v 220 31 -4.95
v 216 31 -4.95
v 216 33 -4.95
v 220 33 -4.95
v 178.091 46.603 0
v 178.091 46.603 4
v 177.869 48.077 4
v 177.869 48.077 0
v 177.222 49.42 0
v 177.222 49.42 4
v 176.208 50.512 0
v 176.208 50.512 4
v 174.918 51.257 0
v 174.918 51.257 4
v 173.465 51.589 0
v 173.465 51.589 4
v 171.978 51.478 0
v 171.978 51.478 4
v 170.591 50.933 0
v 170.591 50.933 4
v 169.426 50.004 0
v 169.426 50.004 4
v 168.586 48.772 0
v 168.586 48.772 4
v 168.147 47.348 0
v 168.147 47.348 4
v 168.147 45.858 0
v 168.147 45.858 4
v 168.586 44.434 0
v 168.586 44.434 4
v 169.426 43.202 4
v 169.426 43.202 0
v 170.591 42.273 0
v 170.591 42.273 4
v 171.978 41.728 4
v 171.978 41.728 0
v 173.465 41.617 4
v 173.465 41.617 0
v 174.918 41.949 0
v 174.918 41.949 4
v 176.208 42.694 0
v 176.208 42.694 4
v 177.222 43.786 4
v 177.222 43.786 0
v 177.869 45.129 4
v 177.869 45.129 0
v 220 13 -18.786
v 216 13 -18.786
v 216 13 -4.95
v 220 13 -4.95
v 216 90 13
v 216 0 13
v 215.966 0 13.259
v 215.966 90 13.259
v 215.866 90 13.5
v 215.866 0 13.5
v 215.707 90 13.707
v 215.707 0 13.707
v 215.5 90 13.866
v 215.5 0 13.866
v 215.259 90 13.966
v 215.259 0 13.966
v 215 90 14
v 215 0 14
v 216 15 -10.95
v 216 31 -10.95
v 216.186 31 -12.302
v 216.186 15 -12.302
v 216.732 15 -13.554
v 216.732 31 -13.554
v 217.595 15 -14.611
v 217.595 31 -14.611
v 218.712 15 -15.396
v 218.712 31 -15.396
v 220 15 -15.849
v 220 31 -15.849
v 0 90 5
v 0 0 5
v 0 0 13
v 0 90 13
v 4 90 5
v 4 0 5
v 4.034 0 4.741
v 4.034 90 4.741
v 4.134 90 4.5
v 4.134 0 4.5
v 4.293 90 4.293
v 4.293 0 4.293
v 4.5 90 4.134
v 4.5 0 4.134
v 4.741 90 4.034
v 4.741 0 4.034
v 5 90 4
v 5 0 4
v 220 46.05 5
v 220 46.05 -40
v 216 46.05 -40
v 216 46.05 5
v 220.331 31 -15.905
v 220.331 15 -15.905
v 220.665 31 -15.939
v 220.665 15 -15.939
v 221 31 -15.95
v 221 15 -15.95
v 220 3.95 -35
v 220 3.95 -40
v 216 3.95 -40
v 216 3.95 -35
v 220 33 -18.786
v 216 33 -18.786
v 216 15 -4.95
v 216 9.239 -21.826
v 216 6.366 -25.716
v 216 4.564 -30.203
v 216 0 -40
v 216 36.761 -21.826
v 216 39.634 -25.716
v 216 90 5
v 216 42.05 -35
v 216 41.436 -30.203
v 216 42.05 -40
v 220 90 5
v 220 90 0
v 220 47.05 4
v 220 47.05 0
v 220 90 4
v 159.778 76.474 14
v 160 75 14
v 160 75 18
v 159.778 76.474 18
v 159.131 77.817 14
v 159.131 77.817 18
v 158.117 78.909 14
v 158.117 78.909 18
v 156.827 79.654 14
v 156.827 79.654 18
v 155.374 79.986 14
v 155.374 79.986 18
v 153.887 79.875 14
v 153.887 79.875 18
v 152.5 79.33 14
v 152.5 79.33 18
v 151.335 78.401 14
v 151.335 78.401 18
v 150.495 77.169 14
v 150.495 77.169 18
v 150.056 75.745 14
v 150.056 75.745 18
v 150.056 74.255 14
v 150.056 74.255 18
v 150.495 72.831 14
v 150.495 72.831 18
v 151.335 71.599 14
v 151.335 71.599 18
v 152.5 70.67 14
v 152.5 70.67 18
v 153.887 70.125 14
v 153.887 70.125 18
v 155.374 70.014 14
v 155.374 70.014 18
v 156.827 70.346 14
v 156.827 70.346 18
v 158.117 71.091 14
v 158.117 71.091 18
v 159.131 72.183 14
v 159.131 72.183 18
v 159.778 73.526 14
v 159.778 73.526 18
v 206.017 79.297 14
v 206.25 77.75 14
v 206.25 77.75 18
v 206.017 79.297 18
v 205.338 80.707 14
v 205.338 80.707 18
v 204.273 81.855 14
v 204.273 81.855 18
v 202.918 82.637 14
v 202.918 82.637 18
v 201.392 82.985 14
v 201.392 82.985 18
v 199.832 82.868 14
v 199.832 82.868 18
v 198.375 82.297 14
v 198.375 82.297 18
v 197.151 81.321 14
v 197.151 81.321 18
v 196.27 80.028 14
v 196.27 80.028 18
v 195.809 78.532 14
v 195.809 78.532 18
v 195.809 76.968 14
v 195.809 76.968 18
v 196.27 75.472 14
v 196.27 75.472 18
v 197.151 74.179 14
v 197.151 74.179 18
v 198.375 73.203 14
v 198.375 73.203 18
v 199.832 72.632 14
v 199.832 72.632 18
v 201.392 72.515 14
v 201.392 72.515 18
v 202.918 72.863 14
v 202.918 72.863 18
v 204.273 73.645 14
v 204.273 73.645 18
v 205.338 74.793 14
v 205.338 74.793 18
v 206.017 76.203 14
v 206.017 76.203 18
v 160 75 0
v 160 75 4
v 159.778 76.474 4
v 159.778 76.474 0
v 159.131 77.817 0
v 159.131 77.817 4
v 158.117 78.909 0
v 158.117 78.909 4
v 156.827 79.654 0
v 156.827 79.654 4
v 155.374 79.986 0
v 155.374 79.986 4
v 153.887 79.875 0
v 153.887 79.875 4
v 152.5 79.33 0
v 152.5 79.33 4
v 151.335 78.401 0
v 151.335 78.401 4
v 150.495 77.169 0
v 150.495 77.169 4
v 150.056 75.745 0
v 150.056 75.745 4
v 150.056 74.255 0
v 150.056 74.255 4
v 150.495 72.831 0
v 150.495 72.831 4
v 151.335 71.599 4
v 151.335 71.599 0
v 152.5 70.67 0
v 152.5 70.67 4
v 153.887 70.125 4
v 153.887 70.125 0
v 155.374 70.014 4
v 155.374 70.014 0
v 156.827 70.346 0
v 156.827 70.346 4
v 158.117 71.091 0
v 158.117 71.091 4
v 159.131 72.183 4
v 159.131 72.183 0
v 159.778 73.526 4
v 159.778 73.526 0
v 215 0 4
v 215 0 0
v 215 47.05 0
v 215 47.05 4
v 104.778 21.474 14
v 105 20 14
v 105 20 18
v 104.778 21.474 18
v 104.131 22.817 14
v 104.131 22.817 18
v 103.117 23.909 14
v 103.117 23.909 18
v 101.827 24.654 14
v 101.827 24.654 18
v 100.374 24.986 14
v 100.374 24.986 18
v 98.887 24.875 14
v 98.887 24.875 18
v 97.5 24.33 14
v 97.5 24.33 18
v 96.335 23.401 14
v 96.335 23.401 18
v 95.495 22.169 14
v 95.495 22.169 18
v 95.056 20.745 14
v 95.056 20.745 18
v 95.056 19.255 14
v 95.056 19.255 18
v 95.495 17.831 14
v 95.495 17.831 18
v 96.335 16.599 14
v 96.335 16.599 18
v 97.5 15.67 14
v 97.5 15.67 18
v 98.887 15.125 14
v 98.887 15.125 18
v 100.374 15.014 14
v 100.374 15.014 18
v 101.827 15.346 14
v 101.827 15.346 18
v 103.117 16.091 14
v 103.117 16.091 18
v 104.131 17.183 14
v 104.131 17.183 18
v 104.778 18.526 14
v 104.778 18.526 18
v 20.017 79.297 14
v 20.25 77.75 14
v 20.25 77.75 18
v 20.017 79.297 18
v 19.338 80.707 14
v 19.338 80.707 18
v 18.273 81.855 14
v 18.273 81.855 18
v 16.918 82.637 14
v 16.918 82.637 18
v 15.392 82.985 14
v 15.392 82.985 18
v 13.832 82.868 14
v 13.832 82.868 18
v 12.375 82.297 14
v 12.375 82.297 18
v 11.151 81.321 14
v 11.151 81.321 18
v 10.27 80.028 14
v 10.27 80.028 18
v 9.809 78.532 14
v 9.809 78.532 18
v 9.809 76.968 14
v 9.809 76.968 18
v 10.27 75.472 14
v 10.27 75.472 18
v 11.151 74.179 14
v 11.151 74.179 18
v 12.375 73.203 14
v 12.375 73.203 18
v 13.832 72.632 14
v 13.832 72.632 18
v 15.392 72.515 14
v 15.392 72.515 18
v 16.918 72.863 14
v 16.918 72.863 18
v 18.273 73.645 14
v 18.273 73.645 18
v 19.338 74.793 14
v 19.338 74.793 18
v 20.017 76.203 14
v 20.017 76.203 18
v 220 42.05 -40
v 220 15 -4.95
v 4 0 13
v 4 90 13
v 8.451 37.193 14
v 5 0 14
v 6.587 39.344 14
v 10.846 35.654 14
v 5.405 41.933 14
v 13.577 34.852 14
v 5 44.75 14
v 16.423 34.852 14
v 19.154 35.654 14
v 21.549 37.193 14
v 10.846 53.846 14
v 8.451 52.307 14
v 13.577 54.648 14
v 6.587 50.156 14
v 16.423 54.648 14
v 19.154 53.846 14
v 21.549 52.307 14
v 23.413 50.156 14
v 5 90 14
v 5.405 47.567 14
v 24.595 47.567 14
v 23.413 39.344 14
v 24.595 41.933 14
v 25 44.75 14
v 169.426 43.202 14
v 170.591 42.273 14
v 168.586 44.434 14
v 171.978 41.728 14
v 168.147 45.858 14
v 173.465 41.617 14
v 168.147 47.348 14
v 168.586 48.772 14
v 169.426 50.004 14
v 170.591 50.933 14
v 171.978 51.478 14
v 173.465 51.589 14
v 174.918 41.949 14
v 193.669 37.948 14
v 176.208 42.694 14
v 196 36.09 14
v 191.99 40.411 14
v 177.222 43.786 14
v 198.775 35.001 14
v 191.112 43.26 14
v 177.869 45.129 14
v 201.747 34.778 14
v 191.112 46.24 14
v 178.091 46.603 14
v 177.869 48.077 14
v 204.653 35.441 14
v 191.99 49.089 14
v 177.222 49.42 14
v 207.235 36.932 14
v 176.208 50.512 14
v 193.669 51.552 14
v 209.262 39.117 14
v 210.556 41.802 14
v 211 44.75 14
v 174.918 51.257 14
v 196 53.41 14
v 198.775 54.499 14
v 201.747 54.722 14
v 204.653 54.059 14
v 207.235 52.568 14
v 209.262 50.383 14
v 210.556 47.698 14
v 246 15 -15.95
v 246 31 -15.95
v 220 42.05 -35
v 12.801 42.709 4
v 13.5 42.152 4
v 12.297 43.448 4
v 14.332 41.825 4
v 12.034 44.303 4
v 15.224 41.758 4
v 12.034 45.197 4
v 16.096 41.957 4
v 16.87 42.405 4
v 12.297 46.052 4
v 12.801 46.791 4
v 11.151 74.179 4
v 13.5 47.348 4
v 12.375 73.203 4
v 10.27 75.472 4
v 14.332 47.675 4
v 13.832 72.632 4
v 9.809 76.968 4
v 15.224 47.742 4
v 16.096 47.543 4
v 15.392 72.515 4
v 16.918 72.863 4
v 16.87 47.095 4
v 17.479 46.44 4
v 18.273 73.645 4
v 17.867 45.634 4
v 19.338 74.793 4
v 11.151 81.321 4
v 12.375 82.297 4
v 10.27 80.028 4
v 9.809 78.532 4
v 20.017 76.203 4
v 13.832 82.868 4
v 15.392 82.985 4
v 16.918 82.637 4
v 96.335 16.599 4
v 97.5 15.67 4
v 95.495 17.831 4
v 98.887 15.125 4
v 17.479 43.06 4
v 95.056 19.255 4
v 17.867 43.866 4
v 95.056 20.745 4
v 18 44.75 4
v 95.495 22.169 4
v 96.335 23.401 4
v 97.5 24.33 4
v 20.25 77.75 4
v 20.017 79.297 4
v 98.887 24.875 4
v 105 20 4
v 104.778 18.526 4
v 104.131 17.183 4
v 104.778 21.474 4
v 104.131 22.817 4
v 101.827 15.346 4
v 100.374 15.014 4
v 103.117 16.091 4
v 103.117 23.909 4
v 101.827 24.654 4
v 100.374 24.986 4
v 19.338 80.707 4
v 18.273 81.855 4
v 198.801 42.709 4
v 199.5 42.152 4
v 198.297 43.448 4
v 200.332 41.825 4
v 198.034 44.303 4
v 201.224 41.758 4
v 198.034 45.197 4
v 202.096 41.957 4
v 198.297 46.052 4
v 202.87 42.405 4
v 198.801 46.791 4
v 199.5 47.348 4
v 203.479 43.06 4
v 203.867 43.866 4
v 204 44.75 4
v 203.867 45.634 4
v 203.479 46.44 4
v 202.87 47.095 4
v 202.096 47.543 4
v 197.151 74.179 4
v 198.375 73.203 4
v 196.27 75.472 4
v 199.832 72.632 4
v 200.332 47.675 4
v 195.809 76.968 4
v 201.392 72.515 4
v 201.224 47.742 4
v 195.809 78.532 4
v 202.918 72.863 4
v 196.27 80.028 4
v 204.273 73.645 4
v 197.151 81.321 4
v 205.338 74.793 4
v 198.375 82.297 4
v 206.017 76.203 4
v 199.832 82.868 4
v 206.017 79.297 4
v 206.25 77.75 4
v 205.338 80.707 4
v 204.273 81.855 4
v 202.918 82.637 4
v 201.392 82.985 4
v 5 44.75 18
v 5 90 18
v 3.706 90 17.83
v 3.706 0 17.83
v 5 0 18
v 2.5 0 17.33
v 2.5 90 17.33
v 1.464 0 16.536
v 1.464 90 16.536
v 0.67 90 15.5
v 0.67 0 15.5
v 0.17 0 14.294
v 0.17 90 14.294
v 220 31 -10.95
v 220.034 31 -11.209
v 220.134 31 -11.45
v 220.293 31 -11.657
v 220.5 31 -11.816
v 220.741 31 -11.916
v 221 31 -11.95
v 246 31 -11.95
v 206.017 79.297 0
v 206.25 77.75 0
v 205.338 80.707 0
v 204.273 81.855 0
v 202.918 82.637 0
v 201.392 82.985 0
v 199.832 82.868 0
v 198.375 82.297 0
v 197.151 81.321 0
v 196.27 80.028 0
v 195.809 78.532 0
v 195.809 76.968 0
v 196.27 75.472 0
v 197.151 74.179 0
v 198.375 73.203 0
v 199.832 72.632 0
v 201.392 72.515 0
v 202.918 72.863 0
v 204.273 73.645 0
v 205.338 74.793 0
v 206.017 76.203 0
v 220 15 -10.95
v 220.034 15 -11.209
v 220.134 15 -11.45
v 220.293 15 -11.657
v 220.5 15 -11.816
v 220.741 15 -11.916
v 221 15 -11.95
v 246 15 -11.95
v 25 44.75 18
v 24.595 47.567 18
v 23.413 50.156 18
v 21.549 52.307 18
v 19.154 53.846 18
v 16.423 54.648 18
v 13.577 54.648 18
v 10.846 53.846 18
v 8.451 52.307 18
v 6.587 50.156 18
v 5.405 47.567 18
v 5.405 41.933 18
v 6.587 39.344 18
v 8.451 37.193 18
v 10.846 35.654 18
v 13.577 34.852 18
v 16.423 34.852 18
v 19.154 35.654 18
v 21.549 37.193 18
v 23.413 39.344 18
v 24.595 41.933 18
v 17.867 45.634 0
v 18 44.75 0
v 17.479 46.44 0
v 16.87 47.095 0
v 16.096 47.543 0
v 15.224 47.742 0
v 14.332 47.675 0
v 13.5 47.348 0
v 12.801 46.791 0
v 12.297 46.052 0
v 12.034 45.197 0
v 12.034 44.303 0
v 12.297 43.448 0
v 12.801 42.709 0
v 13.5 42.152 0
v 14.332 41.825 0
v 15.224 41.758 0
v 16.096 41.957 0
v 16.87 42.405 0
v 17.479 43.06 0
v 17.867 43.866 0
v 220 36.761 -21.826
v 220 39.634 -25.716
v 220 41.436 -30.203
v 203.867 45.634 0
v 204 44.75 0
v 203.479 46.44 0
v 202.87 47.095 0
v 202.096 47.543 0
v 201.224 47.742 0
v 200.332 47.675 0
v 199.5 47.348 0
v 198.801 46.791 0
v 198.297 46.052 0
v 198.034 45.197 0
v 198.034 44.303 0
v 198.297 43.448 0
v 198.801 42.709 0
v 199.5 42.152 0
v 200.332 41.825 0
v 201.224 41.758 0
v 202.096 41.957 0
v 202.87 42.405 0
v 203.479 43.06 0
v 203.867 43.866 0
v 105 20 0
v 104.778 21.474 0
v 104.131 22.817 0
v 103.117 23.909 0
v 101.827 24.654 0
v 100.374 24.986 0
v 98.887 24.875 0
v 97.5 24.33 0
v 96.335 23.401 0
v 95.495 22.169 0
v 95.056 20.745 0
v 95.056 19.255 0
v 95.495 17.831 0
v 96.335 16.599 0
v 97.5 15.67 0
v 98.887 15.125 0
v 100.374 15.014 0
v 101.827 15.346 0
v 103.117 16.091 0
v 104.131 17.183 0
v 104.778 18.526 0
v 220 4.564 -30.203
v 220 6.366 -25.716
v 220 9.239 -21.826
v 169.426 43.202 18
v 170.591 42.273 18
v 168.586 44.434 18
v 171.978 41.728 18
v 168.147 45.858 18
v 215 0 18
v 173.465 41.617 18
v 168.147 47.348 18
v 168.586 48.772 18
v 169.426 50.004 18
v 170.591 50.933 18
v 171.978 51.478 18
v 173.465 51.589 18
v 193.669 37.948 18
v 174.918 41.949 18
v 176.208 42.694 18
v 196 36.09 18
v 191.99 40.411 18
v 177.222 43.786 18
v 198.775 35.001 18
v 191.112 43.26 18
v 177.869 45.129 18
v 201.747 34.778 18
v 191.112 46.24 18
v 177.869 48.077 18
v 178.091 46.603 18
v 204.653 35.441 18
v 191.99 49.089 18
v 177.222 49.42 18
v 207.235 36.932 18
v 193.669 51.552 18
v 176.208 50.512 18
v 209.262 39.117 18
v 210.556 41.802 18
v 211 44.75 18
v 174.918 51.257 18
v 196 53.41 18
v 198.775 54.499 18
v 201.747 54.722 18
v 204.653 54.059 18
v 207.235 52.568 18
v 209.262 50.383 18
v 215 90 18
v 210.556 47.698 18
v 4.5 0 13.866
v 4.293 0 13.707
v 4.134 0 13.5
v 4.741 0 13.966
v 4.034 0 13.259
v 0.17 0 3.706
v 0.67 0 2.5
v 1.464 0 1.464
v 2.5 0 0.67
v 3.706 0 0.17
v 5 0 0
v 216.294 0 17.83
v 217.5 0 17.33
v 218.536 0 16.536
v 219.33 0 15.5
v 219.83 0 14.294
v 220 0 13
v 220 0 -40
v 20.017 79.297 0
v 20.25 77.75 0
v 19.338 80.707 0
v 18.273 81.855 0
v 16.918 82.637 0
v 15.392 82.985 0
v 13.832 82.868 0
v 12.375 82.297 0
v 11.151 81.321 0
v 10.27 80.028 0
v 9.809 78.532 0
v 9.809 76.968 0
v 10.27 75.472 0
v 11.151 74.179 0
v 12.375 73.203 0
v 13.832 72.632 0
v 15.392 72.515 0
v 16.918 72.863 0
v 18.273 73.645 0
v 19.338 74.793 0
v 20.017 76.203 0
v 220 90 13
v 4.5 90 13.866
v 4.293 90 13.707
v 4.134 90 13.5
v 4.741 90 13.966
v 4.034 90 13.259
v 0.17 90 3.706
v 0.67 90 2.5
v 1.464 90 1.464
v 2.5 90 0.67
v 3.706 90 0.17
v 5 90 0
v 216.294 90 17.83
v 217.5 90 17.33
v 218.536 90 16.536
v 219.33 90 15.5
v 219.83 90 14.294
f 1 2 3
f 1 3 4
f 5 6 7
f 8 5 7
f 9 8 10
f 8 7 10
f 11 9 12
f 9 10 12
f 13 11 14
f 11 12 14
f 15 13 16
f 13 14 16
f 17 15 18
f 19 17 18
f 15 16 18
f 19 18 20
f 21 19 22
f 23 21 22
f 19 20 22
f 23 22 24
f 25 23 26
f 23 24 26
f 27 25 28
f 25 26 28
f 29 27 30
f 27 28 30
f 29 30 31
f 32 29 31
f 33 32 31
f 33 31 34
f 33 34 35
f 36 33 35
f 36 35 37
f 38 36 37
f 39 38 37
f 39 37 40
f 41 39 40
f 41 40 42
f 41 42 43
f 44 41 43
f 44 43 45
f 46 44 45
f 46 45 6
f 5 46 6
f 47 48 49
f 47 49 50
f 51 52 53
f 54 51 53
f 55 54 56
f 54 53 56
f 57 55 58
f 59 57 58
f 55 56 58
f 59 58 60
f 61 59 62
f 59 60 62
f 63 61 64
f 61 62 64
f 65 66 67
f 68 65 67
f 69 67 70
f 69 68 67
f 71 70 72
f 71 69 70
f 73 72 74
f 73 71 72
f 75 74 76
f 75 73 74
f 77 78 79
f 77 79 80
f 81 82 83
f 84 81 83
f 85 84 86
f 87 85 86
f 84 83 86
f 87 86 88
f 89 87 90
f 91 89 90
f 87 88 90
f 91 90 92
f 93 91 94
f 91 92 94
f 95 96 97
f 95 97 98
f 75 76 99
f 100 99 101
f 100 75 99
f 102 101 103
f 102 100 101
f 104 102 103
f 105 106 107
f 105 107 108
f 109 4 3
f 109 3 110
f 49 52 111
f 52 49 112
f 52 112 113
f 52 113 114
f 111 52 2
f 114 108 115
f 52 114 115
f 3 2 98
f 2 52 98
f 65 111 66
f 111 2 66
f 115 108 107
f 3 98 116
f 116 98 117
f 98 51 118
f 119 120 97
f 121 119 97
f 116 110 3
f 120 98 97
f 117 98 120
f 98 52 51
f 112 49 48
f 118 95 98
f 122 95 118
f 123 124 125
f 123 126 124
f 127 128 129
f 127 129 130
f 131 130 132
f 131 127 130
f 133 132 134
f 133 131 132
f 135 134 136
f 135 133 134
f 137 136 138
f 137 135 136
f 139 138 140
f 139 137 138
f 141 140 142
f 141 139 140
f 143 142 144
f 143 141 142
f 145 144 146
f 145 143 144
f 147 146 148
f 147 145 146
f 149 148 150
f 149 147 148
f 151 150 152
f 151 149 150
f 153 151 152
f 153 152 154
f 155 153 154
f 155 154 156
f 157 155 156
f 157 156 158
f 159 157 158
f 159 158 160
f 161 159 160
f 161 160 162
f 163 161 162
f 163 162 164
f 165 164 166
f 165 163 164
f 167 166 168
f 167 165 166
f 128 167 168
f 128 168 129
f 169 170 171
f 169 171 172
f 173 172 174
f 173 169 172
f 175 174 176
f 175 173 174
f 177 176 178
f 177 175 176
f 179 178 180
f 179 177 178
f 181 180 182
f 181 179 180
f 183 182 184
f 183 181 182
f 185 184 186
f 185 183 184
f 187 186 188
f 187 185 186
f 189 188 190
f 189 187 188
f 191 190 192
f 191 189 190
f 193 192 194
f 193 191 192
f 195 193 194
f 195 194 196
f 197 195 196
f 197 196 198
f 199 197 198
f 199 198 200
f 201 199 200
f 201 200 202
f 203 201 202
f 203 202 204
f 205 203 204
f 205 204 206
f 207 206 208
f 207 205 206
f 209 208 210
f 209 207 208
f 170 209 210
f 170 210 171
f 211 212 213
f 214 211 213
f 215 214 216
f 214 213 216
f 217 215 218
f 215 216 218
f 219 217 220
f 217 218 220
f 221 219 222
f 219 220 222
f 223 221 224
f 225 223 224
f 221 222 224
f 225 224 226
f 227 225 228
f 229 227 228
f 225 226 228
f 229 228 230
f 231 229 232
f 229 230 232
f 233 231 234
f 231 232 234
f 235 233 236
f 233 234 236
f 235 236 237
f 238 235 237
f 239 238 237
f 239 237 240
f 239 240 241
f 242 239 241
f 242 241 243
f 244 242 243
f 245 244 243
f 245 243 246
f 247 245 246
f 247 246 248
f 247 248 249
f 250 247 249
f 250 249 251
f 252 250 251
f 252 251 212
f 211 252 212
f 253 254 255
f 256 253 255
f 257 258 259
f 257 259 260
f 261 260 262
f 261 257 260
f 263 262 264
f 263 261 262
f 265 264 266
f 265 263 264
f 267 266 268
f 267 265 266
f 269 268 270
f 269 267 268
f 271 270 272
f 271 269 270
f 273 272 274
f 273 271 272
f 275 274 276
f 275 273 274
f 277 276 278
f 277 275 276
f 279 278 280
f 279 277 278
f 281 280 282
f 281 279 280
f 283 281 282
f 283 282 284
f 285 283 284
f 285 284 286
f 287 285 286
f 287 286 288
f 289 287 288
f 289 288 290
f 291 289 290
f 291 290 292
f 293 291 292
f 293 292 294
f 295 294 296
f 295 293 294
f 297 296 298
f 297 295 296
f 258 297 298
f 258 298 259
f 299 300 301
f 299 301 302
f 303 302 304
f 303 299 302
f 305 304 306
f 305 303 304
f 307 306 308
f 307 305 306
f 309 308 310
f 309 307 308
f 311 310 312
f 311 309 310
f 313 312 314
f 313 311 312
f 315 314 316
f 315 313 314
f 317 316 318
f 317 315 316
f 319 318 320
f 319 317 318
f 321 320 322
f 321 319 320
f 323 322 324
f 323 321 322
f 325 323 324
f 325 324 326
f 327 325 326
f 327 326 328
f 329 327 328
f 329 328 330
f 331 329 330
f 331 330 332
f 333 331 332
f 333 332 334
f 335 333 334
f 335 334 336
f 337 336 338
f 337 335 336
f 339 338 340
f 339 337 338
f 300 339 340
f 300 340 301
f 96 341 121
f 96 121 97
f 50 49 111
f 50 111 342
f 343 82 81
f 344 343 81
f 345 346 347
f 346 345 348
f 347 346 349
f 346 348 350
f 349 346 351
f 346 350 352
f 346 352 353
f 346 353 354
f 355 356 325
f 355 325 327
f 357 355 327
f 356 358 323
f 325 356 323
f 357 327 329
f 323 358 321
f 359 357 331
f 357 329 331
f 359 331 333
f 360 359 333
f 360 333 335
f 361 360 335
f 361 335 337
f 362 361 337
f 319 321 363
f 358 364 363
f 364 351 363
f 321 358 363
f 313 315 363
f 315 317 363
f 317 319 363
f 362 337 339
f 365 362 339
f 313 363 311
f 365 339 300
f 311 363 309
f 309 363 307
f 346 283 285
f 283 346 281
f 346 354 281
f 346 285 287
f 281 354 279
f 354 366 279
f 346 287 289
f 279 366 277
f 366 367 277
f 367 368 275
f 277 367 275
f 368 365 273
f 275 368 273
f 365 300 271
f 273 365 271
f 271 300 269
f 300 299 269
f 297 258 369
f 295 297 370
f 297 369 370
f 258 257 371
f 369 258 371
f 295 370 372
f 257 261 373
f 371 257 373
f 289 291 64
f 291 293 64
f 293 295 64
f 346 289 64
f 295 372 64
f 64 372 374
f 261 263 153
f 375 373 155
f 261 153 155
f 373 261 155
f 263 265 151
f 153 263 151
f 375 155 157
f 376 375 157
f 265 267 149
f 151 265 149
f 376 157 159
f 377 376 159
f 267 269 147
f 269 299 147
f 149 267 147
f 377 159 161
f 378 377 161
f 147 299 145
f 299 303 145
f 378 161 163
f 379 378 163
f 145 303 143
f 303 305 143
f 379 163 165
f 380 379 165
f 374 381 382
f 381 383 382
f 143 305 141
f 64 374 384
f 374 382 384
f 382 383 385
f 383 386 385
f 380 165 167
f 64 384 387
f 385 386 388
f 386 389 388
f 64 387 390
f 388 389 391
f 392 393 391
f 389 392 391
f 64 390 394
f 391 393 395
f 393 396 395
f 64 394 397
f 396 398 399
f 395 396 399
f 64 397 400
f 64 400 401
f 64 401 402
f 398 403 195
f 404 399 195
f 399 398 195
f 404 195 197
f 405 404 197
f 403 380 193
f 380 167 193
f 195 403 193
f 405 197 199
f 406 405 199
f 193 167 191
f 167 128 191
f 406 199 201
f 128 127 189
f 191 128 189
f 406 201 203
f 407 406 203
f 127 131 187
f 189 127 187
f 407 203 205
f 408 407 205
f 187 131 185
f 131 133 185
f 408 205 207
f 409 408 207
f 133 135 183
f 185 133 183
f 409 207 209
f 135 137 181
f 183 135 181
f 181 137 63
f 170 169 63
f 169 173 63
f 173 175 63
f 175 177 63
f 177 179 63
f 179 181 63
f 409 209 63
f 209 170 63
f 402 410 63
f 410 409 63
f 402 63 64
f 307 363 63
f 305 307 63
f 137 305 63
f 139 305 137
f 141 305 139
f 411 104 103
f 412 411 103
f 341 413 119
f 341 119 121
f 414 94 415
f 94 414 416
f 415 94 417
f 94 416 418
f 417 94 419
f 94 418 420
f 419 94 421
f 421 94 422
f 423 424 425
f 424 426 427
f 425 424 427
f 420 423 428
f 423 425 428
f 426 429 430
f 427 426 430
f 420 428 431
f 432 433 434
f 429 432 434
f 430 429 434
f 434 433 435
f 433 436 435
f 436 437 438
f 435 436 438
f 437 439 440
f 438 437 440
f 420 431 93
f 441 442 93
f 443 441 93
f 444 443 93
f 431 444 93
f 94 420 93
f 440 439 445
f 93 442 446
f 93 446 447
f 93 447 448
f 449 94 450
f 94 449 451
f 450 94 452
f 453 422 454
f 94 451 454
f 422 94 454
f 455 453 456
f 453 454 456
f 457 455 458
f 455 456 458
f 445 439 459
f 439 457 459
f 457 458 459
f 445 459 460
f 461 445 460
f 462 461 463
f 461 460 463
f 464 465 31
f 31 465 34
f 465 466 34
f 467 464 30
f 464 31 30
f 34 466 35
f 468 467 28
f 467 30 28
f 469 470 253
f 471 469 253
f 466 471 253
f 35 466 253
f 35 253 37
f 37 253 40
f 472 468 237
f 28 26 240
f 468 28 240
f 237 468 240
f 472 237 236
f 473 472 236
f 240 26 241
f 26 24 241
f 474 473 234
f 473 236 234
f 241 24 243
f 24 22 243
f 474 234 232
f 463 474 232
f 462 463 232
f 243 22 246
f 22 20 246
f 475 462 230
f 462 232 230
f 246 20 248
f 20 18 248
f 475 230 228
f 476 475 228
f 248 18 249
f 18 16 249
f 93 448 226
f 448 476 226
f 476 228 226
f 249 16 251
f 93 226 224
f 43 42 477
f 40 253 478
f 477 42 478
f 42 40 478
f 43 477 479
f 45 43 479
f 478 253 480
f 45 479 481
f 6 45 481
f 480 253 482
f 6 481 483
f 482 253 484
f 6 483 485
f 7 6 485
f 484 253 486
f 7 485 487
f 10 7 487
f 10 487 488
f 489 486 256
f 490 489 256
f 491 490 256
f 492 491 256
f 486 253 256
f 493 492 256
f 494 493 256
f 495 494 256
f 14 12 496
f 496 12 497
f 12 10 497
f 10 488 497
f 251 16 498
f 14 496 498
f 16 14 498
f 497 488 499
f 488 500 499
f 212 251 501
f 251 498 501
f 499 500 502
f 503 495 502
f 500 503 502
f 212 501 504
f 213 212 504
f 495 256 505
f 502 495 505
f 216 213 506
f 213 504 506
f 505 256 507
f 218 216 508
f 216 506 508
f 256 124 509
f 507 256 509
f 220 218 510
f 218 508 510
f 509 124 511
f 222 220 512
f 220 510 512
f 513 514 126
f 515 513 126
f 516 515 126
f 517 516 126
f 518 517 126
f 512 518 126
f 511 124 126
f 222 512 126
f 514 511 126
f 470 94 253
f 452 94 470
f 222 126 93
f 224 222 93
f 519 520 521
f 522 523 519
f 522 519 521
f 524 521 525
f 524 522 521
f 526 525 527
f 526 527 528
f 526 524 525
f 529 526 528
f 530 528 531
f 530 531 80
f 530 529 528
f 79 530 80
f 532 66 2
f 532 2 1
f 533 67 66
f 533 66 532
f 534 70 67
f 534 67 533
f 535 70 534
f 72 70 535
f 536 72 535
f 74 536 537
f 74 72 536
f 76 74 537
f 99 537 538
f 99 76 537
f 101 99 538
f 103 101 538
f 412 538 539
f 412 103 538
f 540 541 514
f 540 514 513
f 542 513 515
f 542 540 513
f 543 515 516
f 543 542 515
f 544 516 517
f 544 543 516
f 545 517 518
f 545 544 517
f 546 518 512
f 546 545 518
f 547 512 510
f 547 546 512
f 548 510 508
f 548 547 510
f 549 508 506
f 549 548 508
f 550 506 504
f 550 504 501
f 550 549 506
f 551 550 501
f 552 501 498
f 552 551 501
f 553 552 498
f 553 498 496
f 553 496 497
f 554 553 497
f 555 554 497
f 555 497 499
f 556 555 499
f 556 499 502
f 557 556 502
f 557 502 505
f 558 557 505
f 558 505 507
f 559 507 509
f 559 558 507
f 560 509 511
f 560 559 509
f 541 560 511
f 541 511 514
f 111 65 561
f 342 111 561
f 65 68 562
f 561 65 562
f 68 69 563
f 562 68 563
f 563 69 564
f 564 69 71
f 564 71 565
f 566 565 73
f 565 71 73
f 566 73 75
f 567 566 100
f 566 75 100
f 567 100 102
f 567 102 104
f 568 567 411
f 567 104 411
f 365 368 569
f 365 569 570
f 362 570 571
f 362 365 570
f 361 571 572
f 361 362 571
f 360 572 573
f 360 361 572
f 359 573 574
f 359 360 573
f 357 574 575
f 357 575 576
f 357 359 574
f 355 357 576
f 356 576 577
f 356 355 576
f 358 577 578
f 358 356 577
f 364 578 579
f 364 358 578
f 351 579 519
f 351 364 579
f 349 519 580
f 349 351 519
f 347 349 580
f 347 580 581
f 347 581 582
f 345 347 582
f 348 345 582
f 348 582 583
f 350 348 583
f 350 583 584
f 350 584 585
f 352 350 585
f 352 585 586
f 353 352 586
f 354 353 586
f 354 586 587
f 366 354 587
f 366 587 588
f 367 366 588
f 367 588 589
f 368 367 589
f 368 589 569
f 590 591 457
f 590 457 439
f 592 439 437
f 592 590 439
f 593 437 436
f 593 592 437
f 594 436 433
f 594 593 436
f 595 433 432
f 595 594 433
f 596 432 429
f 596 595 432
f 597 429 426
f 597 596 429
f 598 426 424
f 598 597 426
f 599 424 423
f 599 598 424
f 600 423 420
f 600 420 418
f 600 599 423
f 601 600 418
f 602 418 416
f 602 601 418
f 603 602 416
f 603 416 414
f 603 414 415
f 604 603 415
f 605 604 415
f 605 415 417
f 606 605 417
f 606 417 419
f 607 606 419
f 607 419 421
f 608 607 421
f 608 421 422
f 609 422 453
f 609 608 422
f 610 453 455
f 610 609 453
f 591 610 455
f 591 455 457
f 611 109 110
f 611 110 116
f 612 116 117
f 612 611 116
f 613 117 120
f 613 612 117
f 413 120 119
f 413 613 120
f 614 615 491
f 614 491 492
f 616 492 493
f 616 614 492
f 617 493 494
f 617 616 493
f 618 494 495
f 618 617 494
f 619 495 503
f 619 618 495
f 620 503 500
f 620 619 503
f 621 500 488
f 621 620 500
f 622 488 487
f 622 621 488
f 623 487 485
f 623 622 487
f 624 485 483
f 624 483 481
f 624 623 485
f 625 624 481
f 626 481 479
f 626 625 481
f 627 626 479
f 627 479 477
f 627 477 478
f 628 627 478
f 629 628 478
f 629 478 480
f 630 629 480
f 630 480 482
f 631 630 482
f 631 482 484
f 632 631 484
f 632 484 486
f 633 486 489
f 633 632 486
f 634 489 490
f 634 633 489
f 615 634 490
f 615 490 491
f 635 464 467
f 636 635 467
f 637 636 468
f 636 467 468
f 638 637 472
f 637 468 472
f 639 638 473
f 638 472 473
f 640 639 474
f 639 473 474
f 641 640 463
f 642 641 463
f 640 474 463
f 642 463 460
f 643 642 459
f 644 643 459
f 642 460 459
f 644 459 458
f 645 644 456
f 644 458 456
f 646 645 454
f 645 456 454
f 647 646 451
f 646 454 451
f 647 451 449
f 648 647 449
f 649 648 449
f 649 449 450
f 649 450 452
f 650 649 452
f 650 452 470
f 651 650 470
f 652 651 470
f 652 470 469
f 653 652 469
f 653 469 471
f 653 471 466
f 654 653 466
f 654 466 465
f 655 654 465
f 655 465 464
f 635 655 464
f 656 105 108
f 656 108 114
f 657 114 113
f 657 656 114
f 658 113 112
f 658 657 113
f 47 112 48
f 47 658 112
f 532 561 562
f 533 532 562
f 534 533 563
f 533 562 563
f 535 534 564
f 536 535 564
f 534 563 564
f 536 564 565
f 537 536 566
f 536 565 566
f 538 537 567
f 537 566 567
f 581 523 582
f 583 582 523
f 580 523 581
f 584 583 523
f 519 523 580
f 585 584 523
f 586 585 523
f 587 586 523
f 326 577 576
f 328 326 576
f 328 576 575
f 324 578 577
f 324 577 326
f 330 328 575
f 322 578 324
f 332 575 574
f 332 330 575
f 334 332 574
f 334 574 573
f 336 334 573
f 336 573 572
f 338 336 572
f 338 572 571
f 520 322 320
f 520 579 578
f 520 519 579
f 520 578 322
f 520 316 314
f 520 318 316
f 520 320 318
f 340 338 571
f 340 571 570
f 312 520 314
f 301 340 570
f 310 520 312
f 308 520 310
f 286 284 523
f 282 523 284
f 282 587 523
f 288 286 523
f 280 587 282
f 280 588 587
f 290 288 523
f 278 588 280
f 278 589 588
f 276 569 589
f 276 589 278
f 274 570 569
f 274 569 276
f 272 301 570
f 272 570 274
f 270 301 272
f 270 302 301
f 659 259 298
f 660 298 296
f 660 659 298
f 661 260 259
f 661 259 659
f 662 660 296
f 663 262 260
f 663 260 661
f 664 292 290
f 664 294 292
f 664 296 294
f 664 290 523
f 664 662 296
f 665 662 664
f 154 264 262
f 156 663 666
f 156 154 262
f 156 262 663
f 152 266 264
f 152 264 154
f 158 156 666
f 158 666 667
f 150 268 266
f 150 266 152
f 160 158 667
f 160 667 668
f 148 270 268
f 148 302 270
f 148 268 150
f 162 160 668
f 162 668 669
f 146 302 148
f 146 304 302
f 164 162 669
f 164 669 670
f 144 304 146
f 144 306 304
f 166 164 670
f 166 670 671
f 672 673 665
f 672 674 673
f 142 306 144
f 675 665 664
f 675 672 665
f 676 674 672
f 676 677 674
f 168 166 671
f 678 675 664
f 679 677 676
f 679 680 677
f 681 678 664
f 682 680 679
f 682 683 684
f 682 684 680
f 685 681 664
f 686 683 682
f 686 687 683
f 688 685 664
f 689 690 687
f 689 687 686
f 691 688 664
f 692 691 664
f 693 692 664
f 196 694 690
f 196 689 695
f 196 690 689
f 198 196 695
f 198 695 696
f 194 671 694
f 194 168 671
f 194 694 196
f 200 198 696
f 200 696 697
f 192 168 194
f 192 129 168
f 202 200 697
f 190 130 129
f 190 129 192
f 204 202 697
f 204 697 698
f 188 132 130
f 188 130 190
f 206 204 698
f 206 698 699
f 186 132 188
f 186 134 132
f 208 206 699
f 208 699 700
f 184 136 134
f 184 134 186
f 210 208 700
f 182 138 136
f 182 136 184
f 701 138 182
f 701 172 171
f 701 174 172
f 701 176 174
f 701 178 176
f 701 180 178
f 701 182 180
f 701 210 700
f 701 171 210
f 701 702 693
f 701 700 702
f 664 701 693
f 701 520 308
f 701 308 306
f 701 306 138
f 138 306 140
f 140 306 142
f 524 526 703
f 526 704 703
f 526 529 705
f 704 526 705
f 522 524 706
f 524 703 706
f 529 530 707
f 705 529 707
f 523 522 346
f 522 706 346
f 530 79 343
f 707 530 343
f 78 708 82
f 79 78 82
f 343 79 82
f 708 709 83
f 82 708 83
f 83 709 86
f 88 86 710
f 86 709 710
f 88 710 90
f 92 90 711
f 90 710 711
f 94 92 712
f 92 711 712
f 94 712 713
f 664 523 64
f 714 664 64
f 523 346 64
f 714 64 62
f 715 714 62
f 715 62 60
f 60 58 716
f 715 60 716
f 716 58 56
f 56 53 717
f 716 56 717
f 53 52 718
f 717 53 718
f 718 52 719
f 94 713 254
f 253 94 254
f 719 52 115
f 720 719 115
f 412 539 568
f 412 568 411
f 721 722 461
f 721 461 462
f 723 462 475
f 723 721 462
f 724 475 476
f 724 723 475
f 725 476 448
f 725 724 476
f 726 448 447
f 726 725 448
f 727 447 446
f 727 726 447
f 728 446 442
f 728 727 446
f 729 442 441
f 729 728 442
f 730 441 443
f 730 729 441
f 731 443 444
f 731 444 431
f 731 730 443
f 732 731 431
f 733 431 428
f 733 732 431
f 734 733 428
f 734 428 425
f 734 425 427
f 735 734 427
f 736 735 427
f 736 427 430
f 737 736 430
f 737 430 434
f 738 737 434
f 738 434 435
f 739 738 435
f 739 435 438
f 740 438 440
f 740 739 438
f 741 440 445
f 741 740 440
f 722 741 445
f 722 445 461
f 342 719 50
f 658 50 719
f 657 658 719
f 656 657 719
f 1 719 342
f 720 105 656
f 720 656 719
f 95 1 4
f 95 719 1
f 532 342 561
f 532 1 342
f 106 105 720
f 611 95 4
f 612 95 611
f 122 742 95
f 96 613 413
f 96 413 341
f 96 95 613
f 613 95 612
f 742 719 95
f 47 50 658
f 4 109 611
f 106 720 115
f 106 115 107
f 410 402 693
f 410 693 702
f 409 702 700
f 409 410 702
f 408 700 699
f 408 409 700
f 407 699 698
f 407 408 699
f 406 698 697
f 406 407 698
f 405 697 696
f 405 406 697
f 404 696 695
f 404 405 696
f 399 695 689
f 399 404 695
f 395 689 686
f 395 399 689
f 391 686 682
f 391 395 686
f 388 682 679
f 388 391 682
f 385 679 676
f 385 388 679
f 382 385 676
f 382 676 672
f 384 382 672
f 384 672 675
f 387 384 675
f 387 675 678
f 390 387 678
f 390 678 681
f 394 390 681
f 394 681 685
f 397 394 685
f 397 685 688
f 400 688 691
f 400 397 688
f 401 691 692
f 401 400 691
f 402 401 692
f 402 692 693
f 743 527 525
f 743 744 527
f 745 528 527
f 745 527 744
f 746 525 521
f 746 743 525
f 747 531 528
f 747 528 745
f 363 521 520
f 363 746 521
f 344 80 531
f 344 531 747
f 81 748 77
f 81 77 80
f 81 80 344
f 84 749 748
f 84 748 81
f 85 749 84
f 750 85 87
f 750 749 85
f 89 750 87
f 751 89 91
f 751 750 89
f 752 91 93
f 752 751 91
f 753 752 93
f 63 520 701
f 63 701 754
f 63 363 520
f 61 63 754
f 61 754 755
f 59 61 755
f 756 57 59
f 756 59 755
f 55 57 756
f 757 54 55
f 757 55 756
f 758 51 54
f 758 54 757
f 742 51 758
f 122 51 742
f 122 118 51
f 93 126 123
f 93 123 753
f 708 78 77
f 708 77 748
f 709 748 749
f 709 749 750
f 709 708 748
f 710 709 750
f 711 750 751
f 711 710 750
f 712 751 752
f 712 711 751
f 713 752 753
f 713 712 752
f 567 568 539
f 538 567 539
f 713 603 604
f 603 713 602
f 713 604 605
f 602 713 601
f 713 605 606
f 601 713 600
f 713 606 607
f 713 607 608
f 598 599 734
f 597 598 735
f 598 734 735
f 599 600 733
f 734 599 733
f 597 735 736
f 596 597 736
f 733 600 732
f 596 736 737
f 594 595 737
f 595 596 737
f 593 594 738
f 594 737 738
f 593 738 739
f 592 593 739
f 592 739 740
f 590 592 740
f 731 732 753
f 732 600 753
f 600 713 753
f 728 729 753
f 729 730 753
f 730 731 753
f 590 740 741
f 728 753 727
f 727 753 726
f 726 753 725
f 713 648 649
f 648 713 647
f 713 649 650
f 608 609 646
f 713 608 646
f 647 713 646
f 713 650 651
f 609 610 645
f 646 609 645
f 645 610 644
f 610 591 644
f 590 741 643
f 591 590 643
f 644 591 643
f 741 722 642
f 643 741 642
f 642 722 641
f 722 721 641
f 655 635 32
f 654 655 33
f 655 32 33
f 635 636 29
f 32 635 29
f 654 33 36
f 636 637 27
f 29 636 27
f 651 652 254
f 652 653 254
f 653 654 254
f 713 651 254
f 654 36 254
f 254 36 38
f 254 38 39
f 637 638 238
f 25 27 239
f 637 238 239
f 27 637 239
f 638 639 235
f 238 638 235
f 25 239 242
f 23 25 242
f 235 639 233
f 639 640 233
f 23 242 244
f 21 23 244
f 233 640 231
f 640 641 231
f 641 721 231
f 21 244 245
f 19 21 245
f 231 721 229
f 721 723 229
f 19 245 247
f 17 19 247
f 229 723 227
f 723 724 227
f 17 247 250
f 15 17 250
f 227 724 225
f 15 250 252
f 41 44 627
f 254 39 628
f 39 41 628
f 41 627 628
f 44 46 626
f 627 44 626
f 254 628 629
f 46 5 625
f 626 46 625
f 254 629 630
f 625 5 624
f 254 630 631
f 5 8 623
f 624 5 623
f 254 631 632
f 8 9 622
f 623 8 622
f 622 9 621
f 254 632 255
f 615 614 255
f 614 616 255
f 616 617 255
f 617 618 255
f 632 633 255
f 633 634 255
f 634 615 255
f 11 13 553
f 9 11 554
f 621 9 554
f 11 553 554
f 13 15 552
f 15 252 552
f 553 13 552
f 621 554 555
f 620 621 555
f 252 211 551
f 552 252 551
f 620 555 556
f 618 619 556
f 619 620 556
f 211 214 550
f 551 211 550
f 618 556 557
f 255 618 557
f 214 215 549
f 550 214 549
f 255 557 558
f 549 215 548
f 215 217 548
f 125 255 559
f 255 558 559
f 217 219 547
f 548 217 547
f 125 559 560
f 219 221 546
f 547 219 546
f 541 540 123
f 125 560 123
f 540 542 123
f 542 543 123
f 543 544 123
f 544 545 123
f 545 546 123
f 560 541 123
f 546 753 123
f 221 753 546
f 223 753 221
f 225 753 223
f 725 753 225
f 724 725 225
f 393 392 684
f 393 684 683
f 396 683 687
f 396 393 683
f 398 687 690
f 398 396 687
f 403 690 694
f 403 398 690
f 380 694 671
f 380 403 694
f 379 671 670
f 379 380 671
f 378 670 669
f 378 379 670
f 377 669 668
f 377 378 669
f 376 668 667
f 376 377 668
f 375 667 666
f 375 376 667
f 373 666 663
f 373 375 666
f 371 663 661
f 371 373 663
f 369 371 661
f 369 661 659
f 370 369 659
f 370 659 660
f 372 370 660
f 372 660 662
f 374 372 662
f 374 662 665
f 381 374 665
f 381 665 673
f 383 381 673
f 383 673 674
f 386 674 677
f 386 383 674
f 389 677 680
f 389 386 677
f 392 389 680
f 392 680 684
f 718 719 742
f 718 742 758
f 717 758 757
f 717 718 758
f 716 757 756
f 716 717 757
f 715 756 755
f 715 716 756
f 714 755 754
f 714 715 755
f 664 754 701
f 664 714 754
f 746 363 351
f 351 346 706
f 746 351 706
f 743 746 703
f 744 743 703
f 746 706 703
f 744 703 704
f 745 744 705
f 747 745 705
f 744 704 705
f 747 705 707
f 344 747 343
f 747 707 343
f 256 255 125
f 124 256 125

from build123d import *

# Parameters (mm, degrees)
SKETCH1_W              = 220
SKETCH1_H              = 90
SKETCH1_R              = 3
SKETCH1_R_2            = 5.25
BOSS_EXTRUDE1_DEPTH    = 4
SKETCH3_W              = 4
SKETCH3_H              = 90
BOSS_EXTRUDE2_DEPTH    = 10
SKETCH21_W             = 220
SKETCH21_H             = 90
SKETCH21_R             = 5.25
SKETCH21_R_2           = 10
SKETCH21_R_3           = 5
BOSS_EXTRUDE3_DEPTH    = 4
CUT_EXTRUDE4_REACH     = 240.109
SKETCH35_R             = 5
BOSS_EXTRUDE6_DEPTH    = 4
SKETCH33_W             = 1
SKETCH33_H             = 43.95
CUT_EXTRUDE2_DEPTH     = 4
CUT_EXTRUDE3_DEPTH     = 4
SKETCH41_W             = 4
SKETCH41_H             = 16
BOSS_EXTRUDE8_DEPTH    = 26
CONVERT_SOLID4_DEPTH   = 90
CONVERT_SOLID4_START   = 13
CONVERT_SOLID4_2_DEPTH = 20
CONVERT_SOLID4_3_DEPTH = 2
CONVERT_SOLID4_START_2 = 31
CONVERT_SOLID4_4_DEPTH = 2
CONVERT_SOLID4_5_DEPTH = 90
CONVERT_SOLID4_START_3 = 15
CONVERT_SOLID4_6_DEPTH = 16


# Read off the part's stored shape, not the designer's step: Convert-Solid4
with BuildPart() as part:
    # Sketch1 → Boss-Extrude1 (new body)
    with BuildSketch(Plane.XY):
        with Locations((110, 45)):
            Rectangle(SKETCH1_W, SKETCH1_H)
        with Locations((201, 44.75)):
            Circle(SKETCH1_R, mode=Mode.SUBTRACT)
        with Locations((201, 77.75)):
            Circle(SKETCH1_R_2, mode=Mode.SUBTRACT)
        with Locations((15, 44.75)):
            Circle(SKETCH1_R, mode=Mode.SUBTRACT)
        with Locations((15, 77.75)):
            Circle(SKETCH1_R_2, mode=Mode.SUBTRACT)
    extrude(amount=BOSS_EXTRUDE1_DEPTH)

    # Sketch3 → Boss-Extrude2 (add)
    with BuildSketch(Plane.XY.offset(4)):
        with Locations((2, 45)):
            Rectangle(SKETCH3_W, SKETCH3_H)
        with Locations((218, 45)):
            Rectangle(SKETCH3_W, SKETCH3_H)
    extrude(amount=BOSS_EXTRUDE2_DEPTH)

    # Sketch21 → Boss-Extrude3 (add)
    with BuildSketch(Plane.XY.offset(14)):
        with Locations((110, 45)):
            Rectangle(SKETCH21_W, SKETCH21_H)
        with Locations((201, 77.75)):
            Circle(SKETCH21_R, mode=Mode.SUBTRACT)
        with Locations((15, 77.75)):
            Circle(SKETCH21_R, mode=Mode.SUBTRACT)
        with Locations((15, 44.75)):
            Circle(SKETCH21_R_2, mode=Mode.SUBTRACT)
        with Locations((201, 44.75)):
            Circle(SKETCH21_R_2, mode=Mode.SUBTRACT)
        with Locations((100, 20)):
            Circle(SKETCH21_R_3, mode=Mode.SUBTRACT)
        with Locations((173.090932683, 46.602923891)):
            Circle(SKETCH21_R_3, mode=Mode.SUBTRACT)
        with Locations((155, 75)):
            Circle(SKETCH21_R_3, mode=Mode.SUBTRACT)
    extrude(amount=BOSS_EXTRUDE3_DEPTH)

    # Sketch35 → Cut-Extrude4 (cut, up to next)
    with BuildSketch(Plane.XY.offset(4), mode=Mode.PRIVATE) as cut_extrude4_sk1:
        with Locations((100, 20)):
            Circle(SKETCH35_R)
    cut_extrude4_tool1 = extrude(cut_extrude4_sk1.sketch, amount=-CUT_EXTRUDE4_REACH, mode=Mode.PRIVATE) & part.part
    # Sketch35 → Cut-Extrude4 (cut, up to next)
    with BuildSketch(Plane.XY.offset(4), mode=Mode.PRIVATE) as cut_extrude4_sk2:
        with Locations((173.090932683, 46.602923891)):
            Circle(SKETCH35_R)
    cut_extrude4_tool2 = extrude(cut_extrude4_sk2.sketch, amount=-CUT_EXTRUDE4_REACH, mode=Mode.PRIVATE) & part.part
    # Sketch35 → Cut-Extrude4 (cut, up to next)
    with BuildSketch(Plane.XY.offset(4), mode=Mode.PRIVATE) as cut_extrude4_sk3:
        with Locations((155, 75)):
            Circle(SKETCH35_R)
    cut_extrude4_tool3 = extrude(cut_extrude4_sk3.sketch, amount=-CUT_EXTRUDE4_REACH, mode=Mode.PRIVATE) & part.part
    add(cut_extrude4_tool1.solids().sort_by_distance((100, 20, 4))[0], mode=Mode.SUBTRACT)
    add(cut_extrude4_tool2.solids().sort_by_distance((173.090933, 46.602924, 4))[0], mode=Mode.SUBTRACT)
    add(cut_extrude4_tool3.solids().sort_by_distance((155, 75, 4))[0], mode=Mode.SUBTRACT)

    # Sketch24 → Boss-Extrude6 (add)
    with BuildSketch(Plane(origin=(220, 0, 0), x_dir=(0, 0, -1), z_dir=(1, 0, 0))):
        with BuildLine():
            Line((40, 42.05), (40, 46.05))
            Line((40, 46.05), (0, 46.05))
            Line((0, 46.05), (0, 0))
            Line((0, 0), (40, 0))
            Line((40, 0), (40, 3.95))
            Line((40, 3.95), (35, 3.95))
            ThreePointArc((35, 3.95), (25.715537172, 6.365660518), (18.785731592, 13))
            Line((18.785731592, 13), (15.95, 13))
            Line((15.95, 13), (15.95, 33))
            Line((15.95, 33), (18.785731592, 33))
            ThreePointArc((18.785731592, 33), (25.715537172, 39.634339482), (35, 42.05))
            Line((35, 42.05), (40, 42.05))
        make_face()
    extrude(amount=-BOSS_EXTRUDE6_DEPTH)

    # Sketch33 → Cut-Extrude2 (cut)
    with BuildSketch(Plane(origin=(220, 0, 0), x_dir=(0, 0, -1), z_dir=(1, 0, 0))):
        with Locations((-4.5, 68.025)):
            Rectangle(SKETCH33_W, SKETCH33_H)
    extrude(amount=-CUT_EXTRUDE2_DEPTH, mode=Mode.SUBTRACT)

    # Sketch34 → Cut-Extrude3 (cut)
    with BuildSketch(Plane(origin=(0, 0, 0), x_dir=(-1, 0, 0), z_dir=(0, 0, -1))):
        Polygon((-216, 0), (-215, 0), (-215, 47.05), (-220, 47.05), (-220, 46.05), (-216, 46.05), align=None)
    extrude(amount=-CUT_EXTRUDE3_DEPTH, mode=Mode.SUBTRACT)

    # Sketch41 → Boss-Extrude8 (add)
    with BuildSketch(Plane(origin=(220, 0, 0), x_dir=(0, 0, -1), z_dir=(1, 0, 0))):
        with Locations((13.95, 23)):
            Rectangle(SKETCH41_W, SKETCH41_H)
    extrude(amount=BOSS_EXTRUDE8_DEPTH)

    # Convert-Solid4 outline → Convert-Solid4 (cut)
    with BuildSketch(Plane(origin=(0, 0, 0), x_dir=(1, 0, 0), z_dir=(0, 1, 0))):
        with BuildLine():
            Line((220, 15.95), (220, 15.848979486))
            ThreePointArc((220, 15.848979486), (220.49745519, 15.924680765), (221, 15.95))
            Line((221, 15.95), (220, 15.95))
        make_face()
        with BuildLine():
            ThreePointArc((0, -5), (1.464466094, -1.464466094), (5, 0))
            Line((5, 0), (0, 0))
            Line((0, 0), (0, -5))
        make_face()
        with BuildLine():
            Line((220, -18), (220, -13))
            ThreePointArc((220, -13), (218.535533906, -16.535533906), (215, -18))
            Line((215, -18), (220, -18))
        make_face()
        with BuildLine():
            ThreePointArc((5, -18), (1.464466094, -16.535533906), (0, -13))
            Line((0, -13), (0, -18))
            Line((0, -18), (5, -18))
        make_face()
    extrude(amount=CONVERT_SOLID4_DEPTH, mode=Mode.SUBTRACT)

    # Convert-Solid4 2 outline → Convert-Solid4 2 (cut)
    with BuildSketch(Plane(origin=(0, 0, 0), x_dir=(1, 0, 0), z_dir=(0, 1, 0)).offset(CONVERT_SOLID4_START)):
        with BuildLine():
            Line((216, 15.95), (216, 10.95))
            ThreePointArc((216, 10.95), (217.127016654, 14.11227766), (220, 15.848979486))
            Line((220, 15.848979486), (220, 15.95))
            Line((220, 15.95), (216, 15.95))
        make_face()
    extrude(amount=CONVERT_SOLID4_2_DEPTH, mode=Mode.SUBTRACT)

    # Convert-Solid4 3 outline → Convert-Solid4 3 (cut)
    with BuildSketch(Plane(origin=(0, 0, 0), x_dir=(1, 0, 0), z_dir=(0, 1, 0)).offset(CONVERT_SOLID4_START)):
        with BuildLine():
            Line((216, 10.95), (216, 4.95))
            Line((216, 4.95), (220, 4.95))
            Line((220, 4.95), (220, 15.848979486))
            ThreePointArc((220, 15.848979486), (217.127016654, 14.11227766), (216, 10.95))
        make_face()
    extrude(amount=CONVERT_SOLID4_3_DEPTH, mode=Mode.SUBTRACT)

    # Convert-Solid4 4 outline → Convert-Solid4 4 (cut)
    with BuildSketch(Plane(origin=(0, 0, 0), x_dir=(1, 0, 0), z_dir=(0, 1, 0)).offset(CONVERT_SOLID4_START_2)):
        with BuildLine():
            Line((216, 10.95), (216, 4.95))
            Line((216, 4.95), (220, 4.95))
            Line((220, 4.95), (220, 15.848979486))
            ThreePointArc((220, 15.848979486), (217.127016654, 14.11227766), (216, 10.95))
        make_face()
    extrude(amount=CONVERT_SOLID4_4_DEPTH, mode=Mode.SUBTRACT)

    # Convert-Solid4 5 outline → Convert-Solid4 5 (add)
    with BuildSketch(Plane(origin=(0, 0, 0), x_dir=(1, 0, 0), z_dir=(0, 1, 0))):
        with BuildLine():
            Line((216, -14), (216, -13))
            ThreePointArc((216, -13), (215.707106781, -13.707106781), (215, -14))
            Line((215, -14), (216, -14))
        make_face()
        with BuildLine():
            ThreePointArc((4, -5), (4.292893219, -4.292893219), (5, -4))
            Line((5, -4), (4, -4))
            Line((4, -4), (4, -5))
        make_face()
        with BuildLine():
            Line((4, -14), (5, -14))
            ThreePointArc((5, -14), (4.292893219, -13.707106781), (4, -13))
            Line((4, -13), (4, -14))
        make_face()
    extrude(amount=CONVERT_SOLID4_5_DEPTH)

    # Convert-Solid4 6 outline → Convert-Solid4 6 (add)
    with BuildSketch(Plane(origin=(0, 0, 0), x_dir=(1, 0, 0), z_dir=(0, 1, 0)).offset(CONVERT_SOLID4_START_3)):
        with BuildLine():
            Line((220, 11.95), (220, 10.95))
            ThreePointArc((220, 10.95), (220.292893219, 11.657106781), (221, 11.95))
            Line((221, 11.95), (220, 11.95))
        make_face()
    extrude(amount=CONVERT_SOLID4_6_DEPTH)


solid = part.part
